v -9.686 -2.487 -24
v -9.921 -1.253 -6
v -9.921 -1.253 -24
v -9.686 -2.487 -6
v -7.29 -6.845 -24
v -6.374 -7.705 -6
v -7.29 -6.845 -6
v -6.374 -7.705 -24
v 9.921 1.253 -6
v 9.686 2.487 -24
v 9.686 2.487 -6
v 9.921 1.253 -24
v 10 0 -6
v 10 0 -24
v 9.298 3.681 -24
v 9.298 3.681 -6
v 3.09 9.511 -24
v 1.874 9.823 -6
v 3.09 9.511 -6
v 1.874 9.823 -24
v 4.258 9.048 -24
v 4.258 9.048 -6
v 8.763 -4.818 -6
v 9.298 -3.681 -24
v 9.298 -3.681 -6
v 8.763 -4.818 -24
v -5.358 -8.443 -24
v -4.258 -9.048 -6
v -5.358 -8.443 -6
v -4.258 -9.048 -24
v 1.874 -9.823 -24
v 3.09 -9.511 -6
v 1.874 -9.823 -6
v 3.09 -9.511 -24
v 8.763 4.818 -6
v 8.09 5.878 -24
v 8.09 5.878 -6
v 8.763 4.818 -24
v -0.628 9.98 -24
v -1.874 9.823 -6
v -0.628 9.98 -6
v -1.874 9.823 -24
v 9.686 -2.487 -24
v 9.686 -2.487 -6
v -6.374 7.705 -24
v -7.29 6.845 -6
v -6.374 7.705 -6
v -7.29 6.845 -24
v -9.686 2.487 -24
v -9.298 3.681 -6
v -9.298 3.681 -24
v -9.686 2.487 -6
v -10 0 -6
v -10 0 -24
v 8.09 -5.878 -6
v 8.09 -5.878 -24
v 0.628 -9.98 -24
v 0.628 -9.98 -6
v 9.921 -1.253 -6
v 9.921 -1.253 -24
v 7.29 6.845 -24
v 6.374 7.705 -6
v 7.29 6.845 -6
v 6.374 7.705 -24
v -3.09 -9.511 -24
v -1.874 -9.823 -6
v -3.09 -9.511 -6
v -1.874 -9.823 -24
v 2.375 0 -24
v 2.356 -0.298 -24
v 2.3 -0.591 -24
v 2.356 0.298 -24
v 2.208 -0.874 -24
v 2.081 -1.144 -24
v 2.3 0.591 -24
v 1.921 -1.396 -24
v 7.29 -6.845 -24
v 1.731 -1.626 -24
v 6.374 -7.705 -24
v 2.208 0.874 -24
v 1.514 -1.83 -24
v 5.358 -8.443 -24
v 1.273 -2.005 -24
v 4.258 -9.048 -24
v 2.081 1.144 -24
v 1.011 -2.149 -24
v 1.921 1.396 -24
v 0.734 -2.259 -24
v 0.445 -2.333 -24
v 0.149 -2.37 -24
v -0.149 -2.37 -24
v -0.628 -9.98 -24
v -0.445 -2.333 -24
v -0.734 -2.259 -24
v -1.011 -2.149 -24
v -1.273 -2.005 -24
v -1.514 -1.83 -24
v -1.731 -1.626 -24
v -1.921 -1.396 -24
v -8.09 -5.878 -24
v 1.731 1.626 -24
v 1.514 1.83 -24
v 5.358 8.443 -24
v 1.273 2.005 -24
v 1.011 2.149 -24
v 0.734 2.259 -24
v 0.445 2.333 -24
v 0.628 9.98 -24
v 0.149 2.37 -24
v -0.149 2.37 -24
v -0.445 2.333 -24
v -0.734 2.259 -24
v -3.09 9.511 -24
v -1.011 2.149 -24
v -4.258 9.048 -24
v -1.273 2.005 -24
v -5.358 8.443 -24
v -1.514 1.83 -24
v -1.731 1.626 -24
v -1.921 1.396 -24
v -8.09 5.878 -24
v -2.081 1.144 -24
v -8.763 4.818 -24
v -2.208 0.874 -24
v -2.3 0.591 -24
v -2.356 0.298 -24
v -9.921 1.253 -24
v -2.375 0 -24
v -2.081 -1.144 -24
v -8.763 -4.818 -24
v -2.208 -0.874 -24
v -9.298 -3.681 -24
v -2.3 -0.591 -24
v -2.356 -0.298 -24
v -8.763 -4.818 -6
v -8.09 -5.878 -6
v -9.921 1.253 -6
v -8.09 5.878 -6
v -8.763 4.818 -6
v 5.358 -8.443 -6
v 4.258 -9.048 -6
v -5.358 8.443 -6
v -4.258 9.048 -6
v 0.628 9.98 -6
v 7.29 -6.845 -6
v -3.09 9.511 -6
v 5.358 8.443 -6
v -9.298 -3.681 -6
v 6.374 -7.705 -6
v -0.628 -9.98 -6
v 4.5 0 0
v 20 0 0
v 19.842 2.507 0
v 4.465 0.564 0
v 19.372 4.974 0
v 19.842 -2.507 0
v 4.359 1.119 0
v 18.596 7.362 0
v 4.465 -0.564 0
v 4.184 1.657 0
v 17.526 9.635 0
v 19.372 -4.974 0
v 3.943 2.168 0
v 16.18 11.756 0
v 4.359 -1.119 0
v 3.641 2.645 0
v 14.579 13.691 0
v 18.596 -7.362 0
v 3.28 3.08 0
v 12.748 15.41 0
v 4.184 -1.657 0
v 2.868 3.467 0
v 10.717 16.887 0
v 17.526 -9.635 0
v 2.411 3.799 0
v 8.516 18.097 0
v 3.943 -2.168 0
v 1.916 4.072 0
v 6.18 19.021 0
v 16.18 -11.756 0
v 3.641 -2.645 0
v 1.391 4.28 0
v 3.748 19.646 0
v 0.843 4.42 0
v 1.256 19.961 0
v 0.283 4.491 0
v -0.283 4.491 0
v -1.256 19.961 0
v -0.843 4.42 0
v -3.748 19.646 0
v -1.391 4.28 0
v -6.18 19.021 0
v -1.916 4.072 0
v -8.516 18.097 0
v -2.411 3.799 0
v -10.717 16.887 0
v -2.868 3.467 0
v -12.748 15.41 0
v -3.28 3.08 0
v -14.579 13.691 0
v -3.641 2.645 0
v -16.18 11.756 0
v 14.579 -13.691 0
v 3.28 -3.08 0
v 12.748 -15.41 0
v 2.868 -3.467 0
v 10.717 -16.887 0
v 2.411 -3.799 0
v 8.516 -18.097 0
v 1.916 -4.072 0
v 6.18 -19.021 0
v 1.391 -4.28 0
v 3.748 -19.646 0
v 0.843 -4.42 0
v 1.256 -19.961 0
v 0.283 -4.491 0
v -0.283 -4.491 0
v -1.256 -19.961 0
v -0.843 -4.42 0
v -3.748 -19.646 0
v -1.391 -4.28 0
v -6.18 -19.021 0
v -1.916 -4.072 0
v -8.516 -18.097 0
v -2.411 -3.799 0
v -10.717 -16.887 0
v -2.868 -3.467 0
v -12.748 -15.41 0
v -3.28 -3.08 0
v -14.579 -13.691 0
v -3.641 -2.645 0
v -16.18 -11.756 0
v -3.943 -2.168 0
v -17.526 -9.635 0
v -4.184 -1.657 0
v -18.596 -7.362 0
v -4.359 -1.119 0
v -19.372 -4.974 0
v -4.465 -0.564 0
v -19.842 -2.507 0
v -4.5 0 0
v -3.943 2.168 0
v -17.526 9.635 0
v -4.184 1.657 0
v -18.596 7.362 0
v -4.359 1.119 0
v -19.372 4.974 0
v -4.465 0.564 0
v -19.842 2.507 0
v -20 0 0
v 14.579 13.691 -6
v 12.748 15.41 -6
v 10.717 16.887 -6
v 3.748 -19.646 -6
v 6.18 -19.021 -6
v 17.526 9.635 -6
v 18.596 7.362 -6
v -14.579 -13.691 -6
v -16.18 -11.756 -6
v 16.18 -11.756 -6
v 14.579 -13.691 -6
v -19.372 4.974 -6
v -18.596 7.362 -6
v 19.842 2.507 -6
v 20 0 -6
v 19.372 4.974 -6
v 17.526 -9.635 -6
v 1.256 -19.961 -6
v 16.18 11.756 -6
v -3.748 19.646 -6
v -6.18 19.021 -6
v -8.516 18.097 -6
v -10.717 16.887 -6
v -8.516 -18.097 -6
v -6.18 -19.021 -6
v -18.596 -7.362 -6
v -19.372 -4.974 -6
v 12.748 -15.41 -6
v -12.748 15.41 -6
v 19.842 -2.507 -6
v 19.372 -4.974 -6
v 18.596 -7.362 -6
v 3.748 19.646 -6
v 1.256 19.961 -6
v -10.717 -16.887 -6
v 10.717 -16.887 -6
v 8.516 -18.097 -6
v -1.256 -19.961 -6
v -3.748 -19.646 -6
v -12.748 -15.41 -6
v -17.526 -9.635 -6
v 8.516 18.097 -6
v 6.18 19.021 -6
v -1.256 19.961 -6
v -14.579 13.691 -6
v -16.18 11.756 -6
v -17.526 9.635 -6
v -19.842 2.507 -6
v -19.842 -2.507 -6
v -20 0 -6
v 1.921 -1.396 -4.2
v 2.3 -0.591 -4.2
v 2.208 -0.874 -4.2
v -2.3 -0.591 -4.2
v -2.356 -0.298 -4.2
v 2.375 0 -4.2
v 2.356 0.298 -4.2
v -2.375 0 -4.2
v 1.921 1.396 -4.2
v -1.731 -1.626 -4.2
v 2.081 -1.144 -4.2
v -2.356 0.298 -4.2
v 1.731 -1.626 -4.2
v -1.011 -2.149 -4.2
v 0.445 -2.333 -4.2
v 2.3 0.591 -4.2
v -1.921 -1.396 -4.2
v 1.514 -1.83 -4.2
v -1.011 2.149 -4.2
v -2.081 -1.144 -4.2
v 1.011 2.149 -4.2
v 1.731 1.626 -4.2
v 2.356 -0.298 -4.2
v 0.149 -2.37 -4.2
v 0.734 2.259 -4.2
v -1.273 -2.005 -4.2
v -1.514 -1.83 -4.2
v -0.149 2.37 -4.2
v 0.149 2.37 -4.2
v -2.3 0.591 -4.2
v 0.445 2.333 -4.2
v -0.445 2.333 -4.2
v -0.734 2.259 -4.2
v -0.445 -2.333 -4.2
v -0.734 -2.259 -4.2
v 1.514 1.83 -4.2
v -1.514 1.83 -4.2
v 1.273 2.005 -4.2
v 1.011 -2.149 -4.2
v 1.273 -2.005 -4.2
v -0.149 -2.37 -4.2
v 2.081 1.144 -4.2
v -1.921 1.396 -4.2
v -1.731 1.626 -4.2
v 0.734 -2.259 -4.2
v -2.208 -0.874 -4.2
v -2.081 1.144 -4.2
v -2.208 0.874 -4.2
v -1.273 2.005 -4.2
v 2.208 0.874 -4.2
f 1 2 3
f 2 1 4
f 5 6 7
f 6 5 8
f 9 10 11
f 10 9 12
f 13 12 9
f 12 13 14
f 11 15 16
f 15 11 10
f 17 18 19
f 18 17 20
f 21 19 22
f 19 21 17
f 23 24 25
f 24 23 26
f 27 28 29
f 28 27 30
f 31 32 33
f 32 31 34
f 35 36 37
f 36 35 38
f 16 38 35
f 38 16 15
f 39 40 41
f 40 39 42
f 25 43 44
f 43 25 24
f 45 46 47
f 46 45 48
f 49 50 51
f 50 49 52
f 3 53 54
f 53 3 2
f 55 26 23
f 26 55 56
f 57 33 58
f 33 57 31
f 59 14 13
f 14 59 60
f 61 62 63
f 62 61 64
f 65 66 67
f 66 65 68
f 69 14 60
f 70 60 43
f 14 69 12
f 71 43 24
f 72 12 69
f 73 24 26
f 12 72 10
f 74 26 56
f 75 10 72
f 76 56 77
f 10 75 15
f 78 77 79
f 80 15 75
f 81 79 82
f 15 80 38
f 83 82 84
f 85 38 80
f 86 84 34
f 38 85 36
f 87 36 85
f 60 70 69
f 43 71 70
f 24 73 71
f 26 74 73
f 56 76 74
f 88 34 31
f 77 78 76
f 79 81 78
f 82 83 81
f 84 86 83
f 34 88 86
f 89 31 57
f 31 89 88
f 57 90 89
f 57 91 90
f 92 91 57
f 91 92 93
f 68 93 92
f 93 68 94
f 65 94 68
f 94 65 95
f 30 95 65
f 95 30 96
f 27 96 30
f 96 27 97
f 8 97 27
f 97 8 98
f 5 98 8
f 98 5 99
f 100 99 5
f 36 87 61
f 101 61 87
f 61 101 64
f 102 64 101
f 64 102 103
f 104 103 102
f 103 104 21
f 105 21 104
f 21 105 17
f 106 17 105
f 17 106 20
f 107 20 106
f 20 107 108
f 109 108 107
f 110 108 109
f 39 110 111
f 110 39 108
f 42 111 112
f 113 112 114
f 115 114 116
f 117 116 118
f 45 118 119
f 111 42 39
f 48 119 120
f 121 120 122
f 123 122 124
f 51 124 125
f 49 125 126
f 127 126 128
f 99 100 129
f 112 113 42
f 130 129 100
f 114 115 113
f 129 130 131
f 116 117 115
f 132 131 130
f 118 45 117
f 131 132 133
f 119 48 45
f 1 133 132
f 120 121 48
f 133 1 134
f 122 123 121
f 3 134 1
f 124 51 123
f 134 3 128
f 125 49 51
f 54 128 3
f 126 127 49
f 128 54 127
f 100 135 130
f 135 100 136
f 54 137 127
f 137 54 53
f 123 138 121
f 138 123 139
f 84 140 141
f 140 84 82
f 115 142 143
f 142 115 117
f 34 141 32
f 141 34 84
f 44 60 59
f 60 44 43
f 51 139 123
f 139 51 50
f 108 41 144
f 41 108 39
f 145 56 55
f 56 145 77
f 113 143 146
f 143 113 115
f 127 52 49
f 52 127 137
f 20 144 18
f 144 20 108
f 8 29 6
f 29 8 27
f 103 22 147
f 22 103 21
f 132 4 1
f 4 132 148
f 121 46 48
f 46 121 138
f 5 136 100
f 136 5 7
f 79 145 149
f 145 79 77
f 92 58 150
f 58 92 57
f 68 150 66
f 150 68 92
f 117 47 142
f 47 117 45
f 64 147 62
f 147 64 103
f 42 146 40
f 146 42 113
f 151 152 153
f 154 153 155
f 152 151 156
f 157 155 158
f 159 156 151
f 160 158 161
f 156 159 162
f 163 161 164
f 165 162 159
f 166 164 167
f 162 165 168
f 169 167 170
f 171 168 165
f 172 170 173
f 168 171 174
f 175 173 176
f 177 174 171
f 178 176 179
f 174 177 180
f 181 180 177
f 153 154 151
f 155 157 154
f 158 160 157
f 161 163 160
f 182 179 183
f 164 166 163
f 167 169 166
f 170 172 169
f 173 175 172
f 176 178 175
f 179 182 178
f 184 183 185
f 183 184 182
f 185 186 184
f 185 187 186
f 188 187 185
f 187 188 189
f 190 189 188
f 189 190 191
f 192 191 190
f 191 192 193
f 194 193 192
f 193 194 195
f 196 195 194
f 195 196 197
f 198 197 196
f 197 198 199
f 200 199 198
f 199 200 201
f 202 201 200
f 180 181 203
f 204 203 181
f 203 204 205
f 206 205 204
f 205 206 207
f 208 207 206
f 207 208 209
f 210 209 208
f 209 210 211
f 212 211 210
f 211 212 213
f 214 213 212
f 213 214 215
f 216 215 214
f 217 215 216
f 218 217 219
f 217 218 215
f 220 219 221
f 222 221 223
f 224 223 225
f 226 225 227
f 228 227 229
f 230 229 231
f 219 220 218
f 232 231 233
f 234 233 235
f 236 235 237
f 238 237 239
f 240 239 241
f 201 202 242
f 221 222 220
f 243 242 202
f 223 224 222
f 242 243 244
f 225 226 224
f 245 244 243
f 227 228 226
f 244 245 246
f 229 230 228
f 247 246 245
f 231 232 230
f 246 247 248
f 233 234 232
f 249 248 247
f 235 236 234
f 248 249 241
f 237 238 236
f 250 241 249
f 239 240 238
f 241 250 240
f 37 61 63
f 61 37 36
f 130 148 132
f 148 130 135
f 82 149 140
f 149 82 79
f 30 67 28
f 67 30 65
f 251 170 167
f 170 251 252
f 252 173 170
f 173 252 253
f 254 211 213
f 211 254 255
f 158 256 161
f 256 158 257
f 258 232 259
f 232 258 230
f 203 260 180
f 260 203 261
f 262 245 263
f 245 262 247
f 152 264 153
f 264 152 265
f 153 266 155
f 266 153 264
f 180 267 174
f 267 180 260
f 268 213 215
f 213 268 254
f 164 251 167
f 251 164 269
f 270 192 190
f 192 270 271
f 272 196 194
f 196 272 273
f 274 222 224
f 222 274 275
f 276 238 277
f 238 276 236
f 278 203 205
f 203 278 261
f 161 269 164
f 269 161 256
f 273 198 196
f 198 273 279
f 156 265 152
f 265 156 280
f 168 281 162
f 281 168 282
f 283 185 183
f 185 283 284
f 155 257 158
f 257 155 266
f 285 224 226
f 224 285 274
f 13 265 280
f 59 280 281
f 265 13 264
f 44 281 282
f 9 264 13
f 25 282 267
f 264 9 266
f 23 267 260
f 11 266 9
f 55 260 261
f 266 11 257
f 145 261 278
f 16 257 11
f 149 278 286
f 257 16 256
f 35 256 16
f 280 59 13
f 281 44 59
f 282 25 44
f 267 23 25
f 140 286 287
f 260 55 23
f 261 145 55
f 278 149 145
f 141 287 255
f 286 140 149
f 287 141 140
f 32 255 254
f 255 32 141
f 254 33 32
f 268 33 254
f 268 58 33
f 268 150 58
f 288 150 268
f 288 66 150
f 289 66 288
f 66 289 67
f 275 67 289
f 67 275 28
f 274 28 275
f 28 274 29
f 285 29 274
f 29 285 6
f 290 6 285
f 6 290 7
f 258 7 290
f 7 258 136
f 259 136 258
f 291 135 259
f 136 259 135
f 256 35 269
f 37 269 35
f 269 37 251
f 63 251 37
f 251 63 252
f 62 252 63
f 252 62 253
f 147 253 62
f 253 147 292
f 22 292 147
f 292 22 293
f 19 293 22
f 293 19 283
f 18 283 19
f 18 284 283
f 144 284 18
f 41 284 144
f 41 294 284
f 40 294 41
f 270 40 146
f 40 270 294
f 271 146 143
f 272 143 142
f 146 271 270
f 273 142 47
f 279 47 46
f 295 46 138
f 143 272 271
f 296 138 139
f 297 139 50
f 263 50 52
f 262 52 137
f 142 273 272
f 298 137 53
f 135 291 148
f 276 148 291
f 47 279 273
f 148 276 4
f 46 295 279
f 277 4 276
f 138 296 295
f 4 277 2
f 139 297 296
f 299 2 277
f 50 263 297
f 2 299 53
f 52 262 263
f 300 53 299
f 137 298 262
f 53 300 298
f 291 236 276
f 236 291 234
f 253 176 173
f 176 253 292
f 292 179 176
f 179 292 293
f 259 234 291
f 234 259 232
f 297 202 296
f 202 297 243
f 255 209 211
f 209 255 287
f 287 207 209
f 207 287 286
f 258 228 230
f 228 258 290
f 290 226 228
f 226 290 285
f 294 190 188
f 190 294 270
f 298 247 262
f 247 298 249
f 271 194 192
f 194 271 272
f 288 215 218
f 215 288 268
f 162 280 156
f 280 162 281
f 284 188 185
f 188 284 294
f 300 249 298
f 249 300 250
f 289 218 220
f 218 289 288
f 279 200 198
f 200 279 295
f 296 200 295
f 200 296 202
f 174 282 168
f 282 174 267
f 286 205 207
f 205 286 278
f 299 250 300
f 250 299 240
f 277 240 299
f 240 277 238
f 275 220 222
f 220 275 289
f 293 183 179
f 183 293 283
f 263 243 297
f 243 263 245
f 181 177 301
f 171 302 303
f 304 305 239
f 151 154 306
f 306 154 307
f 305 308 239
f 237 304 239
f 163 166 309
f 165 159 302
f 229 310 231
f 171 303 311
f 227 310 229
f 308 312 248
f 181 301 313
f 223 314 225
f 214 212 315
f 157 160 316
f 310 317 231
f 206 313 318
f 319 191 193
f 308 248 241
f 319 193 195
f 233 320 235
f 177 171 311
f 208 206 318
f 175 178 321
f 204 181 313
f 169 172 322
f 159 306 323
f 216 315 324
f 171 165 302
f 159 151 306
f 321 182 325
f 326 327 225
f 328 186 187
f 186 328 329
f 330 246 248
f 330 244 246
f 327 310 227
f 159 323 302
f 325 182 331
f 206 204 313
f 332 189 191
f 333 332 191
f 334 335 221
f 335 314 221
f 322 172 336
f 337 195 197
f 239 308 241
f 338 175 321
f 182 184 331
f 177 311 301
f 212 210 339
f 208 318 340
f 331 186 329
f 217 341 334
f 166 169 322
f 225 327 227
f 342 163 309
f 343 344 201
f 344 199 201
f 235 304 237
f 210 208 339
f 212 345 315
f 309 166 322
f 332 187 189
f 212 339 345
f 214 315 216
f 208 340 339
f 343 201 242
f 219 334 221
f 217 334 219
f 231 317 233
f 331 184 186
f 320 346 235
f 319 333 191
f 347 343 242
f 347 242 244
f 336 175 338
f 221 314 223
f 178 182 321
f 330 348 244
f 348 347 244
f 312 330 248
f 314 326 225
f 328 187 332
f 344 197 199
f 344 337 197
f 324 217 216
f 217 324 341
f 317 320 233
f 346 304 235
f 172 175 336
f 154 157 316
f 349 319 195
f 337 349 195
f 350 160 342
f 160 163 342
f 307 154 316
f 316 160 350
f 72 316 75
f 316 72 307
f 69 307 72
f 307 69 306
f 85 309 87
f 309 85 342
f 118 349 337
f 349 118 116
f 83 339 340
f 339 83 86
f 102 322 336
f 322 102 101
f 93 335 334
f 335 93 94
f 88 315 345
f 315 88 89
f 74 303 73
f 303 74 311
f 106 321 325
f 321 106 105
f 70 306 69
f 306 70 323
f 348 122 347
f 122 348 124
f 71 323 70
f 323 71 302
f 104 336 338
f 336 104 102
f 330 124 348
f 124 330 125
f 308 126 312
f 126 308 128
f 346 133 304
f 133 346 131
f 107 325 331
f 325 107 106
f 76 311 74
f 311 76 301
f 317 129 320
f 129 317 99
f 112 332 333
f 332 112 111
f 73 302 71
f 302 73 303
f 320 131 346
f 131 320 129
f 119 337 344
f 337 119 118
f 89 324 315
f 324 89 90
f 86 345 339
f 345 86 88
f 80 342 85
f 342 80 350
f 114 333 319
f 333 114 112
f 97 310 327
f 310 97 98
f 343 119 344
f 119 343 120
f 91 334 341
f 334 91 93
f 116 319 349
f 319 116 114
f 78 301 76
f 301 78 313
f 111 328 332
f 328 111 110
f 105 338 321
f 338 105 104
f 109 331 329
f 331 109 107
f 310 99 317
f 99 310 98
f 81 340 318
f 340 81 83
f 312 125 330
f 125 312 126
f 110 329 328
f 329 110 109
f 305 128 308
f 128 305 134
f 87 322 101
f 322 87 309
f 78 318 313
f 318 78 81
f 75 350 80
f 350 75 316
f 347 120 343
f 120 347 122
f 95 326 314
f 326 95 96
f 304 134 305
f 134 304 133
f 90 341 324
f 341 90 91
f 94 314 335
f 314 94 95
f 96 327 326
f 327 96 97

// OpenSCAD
$fn = 50;


difference() {
	union() {
		translate(v = [0, 0, -24.0000000000]) {
			cylinder(h = 24, r = 10.0000000000);
		}
		translate(v = [0, 0, -6.0000000000]) {
			cylinder(h = 6, r = 20.0000000000);
		}
	}
	union() {
		translate(v = [0, 0, 0]) {
			rotate(a = [0, 0, 0]) {
				difference() {
					union() {
						#translate(v = [0, 0, -24.0000000000]) {
							cylinder(h = 24, r = 2.2500000000);
						}
						#translate(v = [0, 0, -4.2000000000]) {
							cylinder(h = 4.2000000000, r = 10.0000000000, r1 = 2.3750000000, r2 = 4.5000000000);
						}
						#translate(v = [0, 0, -24.0000000000]) {
							cylinder(h = 24, r = 2.3750000000);
						}
						#translate(v = [0, 0, -24.0000000000]) {
							cylinder(h = 24, r = 2.2500000000);
						}
					}
					union();
				}
			}
		}
	}
}
